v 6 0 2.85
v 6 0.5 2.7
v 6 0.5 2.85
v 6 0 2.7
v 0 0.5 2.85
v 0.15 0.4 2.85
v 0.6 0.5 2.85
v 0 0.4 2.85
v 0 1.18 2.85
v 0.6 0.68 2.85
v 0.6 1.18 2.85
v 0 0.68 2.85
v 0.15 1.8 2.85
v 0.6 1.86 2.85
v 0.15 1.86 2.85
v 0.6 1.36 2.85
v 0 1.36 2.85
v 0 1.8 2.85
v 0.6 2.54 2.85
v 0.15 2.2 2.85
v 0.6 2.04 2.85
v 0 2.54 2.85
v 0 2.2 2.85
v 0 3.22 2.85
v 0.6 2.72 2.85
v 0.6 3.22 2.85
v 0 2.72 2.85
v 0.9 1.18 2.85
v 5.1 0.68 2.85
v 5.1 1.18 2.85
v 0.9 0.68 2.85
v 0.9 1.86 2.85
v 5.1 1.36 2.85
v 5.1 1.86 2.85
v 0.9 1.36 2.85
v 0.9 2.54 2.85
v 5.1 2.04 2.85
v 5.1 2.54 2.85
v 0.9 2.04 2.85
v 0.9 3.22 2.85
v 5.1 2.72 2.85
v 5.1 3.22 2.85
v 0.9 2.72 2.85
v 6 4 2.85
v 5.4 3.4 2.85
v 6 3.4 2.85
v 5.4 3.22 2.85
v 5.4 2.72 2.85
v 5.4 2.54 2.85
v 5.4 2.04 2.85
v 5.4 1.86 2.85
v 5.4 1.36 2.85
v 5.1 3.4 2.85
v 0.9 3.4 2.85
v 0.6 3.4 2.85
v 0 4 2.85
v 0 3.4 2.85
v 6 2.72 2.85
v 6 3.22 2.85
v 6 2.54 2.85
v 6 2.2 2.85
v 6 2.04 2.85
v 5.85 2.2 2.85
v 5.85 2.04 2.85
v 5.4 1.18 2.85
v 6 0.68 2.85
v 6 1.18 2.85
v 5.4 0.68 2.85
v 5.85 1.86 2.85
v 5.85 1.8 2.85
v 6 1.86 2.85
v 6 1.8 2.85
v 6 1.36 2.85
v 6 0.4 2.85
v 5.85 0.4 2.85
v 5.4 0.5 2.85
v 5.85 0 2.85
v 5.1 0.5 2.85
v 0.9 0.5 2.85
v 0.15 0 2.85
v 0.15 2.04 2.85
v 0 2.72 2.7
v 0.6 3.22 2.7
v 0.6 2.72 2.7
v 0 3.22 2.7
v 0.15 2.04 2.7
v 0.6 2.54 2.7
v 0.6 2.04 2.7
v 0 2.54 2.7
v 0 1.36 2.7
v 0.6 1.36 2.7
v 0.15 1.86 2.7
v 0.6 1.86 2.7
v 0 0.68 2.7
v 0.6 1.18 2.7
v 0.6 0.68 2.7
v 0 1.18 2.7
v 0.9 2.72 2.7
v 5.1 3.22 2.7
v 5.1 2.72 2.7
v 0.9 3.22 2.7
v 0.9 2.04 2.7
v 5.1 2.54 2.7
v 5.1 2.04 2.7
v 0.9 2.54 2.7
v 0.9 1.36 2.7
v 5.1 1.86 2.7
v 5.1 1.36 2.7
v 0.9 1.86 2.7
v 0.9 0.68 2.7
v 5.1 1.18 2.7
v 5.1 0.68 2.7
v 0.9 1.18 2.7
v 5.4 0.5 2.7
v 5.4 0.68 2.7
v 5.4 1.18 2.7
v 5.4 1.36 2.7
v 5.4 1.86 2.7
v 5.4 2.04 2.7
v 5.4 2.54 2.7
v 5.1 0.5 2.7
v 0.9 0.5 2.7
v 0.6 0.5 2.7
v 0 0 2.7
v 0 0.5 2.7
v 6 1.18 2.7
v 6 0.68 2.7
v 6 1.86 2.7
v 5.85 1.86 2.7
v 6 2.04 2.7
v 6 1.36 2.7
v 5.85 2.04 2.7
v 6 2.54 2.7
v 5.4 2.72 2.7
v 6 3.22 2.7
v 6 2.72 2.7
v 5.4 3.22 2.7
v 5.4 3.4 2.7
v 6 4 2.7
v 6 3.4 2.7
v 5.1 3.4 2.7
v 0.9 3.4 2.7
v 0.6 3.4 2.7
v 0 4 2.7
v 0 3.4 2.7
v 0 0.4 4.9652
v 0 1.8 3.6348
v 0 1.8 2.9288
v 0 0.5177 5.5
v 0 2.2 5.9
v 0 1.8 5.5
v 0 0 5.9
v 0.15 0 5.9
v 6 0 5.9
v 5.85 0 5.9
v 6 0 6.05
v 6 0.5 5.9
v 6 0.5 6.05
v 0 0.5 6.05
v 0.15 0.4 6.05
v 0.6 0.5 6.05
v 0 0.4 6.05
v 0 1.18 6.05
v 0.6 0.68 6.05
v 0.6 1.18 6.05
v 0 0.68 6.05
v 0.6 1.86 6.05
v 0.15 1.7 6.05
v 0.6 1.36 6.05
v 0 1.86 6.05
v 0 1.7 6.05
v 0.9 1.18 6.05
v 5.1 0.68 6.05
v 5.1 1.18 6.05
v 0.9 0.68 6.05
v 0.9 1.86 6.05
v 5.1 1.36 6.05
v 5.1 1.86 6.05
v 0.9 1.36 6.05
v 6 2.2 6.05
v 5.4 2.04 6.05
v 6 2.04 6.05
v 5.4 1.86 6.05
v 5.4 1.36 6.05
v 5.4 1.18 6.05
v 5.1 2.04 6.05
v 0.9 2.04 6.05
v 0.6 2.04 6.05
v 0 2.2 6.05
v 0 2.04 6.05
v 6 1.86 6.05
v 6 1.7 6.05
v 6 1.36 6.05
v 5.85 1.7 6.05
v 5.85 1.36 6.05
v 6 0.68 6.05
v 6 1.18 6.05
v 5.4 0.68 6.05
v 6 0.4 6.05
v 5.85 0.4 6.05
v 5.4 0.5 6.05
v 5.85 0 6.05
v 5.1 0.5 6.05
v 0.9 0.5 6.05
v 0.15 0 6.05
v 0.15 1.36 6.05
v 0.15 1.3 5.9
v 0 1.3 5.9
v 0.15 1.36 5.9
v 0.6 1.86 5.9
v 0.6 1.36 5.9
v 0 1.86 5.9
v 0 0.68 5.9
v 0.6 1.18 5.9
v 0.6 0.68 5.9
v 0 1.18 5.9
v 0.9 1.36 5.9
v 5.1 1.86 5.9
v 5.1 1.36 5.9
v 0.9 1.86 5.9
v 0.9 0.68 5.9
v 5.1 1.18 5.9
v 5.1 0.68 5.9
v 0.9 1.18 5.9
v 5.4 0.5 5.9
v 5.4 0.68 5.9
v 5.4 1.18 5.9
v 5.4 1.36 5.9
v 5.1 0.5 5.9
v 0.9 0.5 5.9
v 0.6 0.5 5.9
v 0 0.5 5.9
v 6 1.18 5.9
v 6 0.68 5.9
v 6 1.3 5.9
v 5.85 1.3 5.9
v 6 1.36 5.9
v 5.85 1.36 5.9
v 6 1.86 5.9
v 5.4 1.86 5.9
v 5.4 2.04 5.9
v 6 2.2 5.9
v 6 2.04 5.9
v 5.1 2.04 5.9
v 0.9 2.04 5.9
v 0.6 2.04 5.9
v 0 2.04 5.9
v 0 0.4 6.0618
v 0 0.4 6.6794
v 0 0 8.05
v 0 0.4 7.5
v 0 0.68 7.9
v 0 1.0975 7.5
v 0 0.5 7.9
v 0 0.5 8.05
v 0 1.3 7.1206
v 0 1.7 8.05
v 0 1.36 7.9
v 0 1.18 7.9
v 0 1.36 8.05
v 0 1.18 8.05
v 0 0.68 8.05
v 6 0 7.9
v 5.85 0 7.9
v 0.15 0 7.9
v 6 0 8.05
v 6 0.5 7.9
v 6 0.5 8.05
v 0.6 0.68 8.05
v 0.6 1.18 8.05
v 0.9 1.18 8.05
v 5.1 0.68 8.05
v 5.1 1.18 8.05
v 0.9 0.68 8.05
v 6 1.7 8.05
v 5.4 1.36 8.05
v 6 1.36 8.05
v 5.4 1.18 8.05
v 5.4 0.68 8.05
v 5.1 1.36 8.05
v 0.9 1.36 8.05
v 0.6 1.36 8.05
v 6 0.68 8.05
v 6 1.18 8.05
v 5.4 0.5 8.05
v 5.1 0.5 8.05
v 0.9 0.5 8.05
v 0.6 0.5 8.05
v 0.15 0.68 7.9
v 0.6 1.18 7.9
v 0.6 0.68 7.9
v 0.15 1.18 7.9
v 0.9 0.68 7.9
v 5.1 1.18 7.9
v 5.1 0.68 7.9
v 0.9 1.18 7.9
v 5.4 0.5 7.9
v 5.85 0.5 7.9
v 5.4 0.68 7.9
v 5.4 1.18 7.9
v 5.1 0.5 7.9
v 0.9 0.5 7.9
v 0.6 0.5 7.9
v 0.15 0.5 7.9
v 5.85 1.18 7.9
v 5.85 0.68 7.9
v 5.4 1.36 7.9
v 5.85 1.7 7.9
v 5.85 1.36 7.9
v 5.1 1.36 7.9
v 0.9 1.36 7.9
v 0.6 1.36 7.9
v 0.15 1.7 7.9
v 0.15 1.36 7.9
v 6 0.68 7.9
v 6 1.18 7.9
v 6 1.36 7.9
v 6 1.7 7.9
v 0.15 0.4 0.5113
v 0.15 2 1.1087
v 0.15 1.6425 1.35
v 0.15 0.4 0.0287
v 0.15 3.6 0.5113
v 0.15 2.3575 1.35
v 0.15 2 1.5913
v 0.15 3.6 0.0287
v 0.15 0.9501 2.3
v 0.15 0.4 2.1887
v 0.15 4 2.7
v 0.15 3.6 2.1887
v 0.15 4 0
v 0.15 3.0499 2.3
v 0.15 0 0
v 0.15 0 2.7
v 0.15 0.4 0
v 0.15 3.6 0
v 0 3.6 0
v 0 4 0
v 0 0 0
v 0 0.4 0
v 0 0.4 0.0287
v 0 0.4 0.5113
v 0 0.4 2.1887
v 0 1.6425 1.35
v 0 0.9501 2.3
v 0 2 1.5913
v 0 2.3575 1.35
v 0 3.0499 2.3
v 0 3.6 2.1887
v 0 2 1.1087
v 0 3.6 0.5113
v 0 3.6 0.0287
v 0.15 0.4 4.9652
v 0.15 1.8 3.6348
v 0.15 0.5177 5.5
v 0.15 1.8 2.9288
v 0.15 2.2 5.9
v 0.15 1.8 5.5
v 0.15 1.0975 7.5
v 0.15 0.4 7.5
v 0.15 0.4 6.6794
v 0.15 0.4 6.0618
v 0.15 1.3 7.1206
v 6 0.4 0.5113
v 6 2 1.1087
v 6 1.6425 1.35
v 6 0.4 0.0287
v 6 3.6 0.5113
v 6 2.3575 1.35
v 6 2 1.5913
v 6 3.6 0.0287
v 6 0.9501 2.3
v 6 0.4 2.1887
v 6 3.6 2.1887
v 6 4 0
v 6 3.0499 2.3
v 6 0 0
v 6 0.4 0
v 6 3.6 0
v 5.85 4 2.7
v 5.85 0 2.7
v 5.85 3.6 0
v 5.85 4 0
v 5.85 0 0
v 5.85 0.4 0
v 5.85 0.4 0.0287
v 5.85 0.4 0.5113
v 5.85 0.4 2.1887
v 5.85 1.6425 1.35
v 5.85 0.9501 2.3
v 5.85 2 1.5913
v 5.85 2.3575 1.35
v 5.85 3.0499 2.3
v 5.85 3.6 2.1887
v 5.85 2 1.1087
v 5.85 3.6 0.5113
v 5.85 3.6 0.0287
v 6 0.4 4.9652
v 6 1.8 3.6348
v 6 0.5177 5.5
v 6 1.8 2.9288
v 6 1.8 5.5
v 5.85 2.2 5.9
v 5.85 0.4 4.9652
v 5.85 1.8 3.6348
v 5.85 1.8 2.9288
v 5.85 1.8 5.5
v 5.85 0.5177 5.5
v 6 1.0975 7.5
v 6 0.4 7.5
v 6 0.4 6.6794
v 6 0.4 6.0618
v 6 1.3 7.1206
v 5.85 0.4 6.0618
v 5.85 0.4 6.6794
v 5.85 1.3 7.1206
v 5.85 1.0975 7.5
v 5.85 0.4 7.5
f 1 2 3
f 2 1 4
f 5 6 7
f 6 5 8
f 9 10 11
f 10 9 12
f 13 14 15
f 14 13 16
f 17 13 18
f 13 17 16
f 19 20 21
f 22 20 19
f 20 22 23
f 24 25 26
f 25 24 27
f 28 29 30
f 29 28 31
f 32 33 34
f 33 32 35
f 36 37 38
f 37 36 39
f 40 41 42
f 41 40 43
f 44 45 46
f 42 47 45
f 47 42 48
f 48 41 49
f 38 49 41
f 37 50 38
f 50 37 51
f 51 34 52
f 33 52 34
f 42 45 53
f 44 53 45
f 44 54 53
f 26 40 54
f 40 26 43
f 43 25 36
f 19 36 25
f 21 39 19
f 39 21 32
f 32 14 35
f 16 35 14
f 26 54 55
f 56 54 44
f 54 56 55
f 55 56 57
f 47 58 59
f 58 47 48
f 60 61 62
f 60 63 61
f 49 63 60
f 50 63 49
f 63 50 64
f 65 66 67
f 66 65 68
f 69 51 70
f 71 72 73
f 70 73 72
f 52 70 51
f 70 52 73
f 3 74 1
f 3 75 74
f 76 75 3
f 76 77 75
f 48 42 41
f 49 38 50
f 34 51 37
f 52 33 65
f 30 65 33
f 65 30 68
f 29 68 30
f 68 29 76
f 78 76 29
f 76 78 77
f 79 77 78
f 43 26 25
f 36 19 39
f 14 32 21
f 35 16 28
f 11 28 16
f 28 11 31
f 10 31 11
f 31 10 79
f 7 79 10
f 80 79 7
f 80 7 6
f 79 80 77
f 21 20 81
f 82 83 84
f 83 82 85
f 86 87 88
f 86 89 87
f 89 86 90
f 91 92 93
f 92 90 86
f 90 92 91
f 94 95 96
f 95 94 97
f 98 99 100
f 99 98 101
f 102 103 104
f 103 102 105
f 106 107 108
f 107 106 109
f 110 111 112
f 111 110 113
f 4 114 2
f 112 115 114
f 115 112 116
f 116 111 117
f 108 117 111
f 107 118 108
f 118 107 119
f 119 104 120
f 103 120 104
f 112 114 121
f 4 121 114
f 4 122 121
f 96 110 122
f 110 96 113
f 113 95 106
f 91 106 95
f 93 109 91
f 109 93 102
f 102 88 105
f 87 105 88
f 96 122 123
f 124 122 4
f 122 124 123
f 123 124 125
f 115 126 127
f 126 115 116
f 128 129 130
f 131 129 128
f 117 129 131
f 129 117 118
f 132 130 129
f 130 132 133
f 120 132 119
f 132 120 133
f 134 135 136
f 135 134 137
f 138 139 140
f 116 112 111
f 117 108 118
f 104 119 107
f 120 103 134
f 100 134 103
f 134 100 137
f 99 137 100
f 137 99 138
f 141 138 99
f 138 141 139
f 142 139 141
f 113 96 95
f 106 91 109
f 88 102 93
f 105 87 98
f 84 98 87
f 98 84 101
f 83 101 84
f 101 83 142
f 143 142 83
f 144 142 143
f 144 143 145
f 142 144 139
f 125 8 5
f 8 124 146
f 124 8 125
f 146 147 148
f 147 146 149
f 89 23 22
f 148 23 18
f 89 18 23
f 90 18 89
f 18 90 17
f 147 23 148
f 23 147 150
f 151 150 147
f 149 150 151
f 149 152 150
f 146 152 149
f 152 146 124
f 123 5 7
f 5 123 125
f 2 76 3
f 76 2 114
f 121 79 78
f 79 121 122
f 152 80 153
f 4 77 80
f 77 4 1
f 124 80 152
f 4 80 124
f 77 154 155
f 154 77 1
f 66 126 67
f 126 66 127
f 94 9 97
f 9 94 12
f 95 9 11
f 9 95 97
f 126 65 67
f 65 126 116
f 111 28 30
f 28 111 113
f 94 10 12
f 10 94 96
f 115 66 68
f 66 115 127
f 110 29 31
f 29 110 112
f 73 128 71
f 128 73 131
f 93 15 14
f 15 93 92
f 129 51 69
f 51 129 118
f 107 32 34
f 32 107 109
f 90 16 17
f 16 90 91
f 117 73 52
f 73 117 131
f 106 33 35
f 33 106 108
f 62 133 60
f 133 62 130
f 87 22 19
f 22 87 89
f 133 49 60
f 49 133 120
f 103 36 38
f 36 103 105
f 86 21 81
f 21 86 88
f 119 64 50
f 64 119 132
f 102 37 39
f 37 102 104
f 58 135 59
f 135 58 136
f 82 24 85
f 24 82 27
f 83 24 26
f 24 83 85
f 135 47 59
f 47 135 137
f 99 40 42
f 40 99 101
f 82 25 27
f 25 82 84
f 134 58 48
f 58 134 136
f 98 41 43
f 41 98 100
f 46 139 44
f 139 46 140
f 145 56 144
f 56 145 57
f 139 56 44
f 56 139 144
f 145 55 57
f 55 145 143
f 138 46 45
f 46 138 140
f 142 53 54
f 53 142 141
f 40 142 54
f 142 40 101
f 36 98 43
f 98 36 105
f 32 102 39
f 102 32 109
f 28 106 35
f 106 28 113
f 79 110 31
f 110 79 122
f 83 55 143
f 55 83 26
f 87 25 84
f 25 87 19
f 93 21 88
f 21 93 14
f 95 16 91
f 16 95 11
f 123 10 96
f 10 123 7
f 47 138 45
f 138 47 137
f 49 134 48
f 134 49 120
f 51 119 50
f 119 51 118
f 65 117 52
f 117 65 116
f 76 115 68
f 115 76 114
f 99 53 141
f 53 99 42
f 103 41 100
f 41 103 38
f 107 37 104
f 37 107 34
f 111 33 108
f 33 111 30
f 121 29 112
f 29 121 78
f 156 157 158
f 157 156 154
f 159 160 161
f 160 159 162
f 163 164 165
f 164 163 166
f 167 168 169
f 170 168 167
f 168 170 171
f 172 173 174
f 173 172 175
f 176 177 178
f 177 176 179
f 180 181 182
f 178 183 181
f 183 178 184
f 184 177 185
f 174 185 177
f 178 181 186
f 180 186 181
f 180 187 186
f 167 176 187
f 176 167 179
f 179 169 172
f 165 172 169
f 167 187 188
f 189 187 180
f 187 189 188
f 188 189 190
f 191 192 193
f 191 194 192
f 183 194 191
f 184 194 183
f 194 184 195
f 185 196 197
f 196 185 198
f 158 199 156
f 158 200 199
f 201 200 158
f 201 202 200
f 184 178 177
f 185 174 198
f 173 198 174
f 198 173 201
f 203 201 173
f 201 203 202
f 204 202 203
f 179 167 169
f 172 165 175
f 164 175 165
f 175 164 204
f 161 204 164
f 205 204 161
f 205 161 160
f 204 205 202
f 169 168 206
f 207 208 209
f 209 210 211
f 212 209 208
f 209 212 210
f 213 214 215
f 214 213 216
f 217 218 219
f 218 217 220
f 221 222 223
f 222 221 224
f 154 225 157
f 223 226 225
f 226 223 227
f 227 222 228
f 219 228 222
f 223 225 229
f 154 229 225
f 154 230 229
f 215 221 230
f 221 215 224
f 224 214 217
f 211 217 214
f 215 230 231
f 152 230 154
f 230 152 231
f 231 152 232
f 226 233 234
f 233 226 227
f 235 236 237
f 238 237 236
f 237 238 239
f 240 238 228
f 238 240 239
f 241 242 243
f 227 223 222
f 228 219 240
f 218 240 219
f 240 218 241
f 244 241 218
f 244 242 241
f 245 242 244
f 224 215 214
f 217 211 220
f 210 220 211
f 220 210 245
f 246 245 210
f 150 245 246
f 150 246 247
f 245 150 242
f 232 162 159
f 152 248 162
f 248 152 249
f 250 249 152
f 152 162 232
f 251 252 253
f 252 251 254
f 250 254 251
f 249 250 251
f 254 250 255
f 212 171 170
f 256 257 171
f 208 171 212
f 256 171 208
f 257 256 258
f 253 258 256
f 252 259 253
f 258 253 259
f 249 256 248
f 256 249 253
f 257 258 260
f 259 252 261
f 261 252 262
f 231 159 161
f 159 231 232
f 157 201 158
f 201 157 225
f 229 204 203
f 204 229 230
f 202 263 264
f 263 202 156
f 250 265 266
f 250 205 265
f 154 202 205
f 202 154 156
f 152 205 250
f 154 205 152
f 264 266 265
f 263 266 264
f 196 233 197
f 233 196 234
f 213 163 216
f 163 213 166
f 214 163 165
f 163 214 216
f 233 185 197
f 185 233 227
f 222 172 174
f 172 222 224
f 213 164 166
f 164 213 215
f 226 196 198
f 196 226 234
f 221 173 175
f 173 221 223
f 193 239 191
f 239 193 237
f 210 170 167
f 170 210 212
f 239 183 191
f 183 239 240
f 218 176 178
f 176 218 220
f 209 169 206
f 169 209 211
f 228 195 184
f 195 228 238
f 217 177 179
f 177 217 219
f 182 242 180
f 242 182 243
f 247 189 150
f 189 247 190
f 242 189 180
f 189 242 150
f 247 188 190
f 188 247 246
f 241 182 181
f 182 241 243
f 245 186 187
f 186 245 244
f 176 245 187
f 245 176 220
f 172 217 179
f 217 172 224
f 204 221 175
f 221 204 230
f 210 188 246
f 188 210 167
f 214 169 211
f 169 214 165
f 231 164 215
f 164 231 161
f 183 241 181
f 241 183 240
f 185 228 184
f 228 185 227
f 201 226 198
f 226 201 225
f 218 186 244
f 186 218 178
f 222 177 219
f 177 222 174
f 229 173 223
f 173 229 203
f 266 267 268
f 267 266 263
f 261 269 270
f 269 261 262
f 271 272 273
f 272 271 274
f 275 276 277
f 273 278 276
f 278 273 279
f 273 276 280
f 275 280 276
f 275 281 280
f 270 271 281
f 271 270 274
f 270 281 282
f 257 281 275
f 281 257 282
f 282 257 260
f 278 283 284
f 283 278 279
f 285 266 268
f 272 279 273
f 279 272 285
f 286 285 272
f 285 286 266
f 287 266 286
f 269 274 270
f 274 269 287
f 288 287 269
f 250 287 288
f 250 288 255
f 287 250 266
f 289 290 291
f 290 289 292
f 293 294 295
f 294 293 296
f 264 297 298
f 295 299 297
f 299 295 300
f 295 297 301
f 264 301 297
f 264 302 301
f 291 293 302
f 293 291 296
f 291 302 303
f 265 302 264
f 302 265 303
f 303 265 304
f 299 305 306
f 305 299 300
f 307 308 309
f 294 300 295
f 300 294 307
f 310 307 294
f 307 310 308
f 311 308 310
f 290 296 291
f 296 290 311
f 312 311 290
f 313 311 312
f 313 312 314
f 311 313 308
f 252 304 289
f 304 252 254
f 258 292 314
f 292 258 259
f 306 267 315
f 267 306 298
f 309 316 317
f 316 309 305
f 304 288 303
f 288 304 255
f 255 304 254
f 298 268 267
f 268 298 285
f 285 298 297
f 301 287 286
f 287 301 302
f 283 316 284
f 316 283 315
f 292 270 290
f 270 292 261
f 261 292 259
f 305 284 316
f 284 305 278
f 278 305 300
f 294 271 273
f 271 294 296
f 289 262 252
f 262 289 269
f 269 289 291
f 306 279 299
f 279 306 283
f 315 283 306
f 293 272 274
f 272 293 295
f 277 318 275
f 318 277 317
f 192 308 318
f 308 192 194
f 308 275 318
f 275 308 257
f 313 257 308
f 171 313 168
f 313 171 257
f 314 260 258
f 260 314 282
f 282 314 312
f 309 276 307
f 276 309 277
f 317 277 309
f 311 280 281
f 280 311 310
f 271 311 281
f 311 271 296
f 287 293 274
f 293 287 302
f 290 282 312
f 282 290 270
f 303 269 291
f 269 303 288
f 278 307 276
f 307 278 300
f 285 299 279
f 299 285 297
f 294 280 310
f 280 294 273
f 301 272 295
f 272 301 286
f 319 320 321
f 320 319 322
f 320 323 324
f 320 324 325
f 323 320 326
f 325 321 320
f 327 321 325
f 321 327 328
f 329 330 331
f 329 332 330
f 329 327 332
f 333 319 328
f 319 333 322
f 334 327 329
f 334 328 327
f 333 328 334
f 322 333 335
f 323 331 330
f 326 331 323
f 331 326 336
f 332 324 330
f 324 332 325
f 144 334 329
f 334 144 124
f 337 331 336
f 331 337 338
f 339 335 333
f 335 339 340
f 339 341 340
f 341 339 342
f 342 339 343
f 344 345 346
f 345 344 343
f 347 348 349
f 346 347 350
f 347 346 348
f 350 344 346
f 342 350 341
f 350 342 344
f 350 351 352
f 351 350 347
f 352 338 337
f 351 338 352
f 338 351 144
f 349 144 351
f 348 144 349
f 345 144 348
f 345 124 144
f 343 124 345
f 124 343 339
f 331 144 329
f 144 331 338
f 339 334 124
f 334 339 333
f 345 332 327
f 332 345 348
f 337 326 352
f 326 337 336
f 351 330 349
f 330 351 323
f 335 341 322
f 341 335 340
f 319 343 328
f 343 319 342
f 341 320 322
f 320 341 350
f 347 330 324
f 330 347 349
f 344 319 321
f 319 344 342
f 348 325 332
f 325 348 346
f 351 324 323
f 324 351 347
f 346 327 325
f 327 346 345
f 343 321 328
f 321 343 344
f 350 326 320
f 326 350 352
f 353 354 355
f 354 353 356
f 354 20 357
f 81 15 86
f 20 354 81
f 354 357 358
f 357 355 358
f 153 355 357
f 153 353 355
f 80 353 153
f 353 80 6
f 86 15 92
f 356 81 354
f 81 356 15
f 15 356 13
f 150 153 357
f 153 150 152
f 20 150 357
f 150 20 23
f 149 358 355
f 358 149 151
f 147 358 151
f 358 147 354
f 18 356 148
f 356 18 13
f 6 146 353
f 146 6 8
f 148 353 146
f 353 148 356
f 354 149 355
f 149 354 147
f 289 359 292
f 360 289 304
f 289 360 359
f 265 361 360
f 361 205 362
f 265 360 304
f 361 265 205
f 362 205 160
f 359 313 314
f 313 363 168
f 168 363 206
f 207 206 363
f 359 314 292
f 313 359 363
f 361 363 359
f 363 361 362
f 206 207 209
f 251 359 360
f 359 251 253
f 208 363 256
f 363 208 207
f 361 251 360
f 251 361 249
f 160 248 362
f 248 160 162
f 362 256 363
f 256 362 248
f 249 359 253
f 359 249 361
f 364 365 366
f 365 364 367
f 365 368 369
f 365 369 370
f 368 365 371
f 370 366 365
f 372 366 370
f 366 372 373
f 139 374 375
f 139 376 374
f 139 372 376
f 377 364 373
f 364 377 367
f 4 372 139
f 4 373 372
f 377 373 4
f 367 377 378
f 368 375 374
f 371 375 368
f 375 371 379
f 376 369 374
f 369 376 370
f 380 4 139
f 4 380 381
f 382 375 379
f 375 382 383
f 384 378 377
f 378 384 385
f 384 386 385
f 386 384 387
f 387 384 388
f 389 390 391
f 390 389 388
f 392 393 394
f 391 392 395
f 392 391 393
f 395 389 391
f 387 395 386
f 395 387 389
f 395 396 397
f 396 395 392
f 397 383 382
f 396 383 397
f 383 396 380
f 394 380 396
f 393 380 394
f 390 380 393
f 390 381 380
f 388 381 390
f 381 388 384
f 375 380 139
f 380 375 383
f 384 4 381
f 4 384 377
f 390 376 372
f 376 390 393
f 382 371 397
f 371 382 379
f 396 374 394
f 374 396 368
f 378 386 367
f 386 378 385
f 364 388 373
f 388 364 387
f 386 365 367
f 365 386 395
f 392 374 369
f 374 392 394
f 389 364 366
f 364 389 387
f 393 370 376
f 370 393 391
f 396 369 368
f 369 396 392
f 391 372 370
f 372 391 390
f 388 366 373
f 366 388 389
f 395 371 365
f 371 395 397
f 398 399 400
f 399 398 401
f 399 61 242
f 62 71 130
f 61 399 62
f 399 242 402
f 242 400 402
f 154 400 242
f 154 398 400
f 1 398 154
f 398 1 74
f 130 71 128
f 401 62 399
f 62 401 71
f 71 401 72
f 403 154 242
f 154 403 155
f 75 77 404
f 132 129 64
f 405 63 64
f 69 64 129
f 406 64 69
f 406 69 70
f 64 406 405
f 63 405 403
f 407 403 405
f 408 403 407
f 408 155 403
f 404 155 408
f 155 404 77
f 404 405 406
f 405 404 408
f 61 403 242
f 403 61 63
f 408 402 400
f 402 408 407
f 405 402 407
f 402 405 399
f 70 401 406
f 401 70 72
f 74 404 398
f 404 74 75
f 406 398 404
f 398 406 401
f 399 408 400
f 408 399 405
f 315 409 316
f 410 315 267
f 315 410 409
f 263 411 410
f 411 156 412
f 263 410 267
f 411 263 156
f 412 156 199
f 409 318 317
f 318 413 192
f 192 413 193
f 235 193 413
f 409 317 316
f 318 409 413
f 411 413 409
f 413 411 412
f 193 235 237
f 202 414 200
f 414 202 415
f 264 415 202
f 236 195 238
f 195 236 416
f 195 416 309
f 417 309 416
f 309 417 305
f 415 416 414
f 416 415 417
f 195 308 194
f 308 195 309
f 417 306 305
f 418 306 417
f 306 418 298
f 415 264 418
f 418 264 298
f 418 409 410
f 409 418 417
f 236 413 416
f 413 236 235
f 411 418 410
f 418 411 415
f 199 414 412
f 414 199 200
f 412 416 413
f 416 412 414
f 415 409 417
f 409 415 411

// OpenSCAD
// A shelf
//
// The shelf that came with my tiny house wooden set. I measured it and tried
// to rebuild it in OpenSCAD.
//
// Daniel Schaefer 2022

// Thickness of the wood sheets
thickness = 0.15;
// Strength of the frame
strength = 0.4;

 // How far a plank is away from the next
plank_dist = 0.18;
// Horizontal plank width
plank_width = 0.5;
// Orthogonal plank width
ortho_plank_width = 0.3;

// Width (X-Size) of the entire structure
width = 6;
// Y-Size of the different layers
first_y = 4;
second_y = 2.2;
third_y = 1.7;
// Heights of the different layers
first_height = 2.7;
second_height = 3.2;
third_height = 2;

shelf();

module shelf() {
    translate([0, 0, first_height])
        floor(width, first_y);
    translate([0, 0, first_height+second_height])
        floor(width, second_y);
    translate([0, 0, first_height+second_height+third_height])
        floor(width, third_y);

    // Left and right side
    side();
    translate([width-thickness, 0, 0])
        side();
}

module floor(xlen, ylen) {
    planks = floor(ylen / (plank_width + plank_dist));

    for (i = [0 : planks - 1]) {
        translate([0, (plank_width + plank_dist) * i, 0])
            cube([xlen, plank_width, thickness]);
    }
    // One more plank to fit the remaining space
    last_p_width = ylen - planks * (plank_width + plank_dist);
    translate([0, (plank_width + plank_dist) * planks, 0])
        cube([xlen, last_p_width, thickness]);

    // Orthogonal planks. One on each side
    translate([0.6, 0, 0])
        cube([ortho_plank_width, ylen, thickness]);
    translate([xlen - ortho_plank_width - 0.6, 0, 0])
        cube([ortho_plank_width, ylen, thickness]);
}

module side() {
    side_piece(first_y, first_height, true, true);

    translate([0,0,first_height])
        side_piece(second_y, second_height, false, true);

    translate([0,0,first_height + second_height])
        side_piece(third_y, third_height, true, false);
}

module side_piece(width, height, fw_diag, bw_diag)  {
    // Side square with cutout (turns into frame)
    difference() {
        cube([thickness, width, height]);

        translate([0, strength, 0])
        cube([thickness, width-strength*2, height-strength]);

    };

    if (fw_diag)
        diagonal(width, height, forward=true);
    if (bw_diag)
        diagonal(width, height, forward=false);
}

module diagonal(width, height, forward) {
    // Put center of bar in the middle of square and then
    // rotate as the diagonal (hypotenuse of the triangle)
    hypotenuse = sqrt(width^2 + height^2);
    angle = forward ? -asin(width/hypotenuse) : asin(width/hypotenuse);
    translate([0.5*thickness, width / 2, height/2])
    rotate([angle, 0, 0])
        // Need to make it a bit shorter than the hypotenuse, so it doesn't protrude on the sides
        cube([thickness, strength, hypotenuse-strength*1.5], center=true);
}
